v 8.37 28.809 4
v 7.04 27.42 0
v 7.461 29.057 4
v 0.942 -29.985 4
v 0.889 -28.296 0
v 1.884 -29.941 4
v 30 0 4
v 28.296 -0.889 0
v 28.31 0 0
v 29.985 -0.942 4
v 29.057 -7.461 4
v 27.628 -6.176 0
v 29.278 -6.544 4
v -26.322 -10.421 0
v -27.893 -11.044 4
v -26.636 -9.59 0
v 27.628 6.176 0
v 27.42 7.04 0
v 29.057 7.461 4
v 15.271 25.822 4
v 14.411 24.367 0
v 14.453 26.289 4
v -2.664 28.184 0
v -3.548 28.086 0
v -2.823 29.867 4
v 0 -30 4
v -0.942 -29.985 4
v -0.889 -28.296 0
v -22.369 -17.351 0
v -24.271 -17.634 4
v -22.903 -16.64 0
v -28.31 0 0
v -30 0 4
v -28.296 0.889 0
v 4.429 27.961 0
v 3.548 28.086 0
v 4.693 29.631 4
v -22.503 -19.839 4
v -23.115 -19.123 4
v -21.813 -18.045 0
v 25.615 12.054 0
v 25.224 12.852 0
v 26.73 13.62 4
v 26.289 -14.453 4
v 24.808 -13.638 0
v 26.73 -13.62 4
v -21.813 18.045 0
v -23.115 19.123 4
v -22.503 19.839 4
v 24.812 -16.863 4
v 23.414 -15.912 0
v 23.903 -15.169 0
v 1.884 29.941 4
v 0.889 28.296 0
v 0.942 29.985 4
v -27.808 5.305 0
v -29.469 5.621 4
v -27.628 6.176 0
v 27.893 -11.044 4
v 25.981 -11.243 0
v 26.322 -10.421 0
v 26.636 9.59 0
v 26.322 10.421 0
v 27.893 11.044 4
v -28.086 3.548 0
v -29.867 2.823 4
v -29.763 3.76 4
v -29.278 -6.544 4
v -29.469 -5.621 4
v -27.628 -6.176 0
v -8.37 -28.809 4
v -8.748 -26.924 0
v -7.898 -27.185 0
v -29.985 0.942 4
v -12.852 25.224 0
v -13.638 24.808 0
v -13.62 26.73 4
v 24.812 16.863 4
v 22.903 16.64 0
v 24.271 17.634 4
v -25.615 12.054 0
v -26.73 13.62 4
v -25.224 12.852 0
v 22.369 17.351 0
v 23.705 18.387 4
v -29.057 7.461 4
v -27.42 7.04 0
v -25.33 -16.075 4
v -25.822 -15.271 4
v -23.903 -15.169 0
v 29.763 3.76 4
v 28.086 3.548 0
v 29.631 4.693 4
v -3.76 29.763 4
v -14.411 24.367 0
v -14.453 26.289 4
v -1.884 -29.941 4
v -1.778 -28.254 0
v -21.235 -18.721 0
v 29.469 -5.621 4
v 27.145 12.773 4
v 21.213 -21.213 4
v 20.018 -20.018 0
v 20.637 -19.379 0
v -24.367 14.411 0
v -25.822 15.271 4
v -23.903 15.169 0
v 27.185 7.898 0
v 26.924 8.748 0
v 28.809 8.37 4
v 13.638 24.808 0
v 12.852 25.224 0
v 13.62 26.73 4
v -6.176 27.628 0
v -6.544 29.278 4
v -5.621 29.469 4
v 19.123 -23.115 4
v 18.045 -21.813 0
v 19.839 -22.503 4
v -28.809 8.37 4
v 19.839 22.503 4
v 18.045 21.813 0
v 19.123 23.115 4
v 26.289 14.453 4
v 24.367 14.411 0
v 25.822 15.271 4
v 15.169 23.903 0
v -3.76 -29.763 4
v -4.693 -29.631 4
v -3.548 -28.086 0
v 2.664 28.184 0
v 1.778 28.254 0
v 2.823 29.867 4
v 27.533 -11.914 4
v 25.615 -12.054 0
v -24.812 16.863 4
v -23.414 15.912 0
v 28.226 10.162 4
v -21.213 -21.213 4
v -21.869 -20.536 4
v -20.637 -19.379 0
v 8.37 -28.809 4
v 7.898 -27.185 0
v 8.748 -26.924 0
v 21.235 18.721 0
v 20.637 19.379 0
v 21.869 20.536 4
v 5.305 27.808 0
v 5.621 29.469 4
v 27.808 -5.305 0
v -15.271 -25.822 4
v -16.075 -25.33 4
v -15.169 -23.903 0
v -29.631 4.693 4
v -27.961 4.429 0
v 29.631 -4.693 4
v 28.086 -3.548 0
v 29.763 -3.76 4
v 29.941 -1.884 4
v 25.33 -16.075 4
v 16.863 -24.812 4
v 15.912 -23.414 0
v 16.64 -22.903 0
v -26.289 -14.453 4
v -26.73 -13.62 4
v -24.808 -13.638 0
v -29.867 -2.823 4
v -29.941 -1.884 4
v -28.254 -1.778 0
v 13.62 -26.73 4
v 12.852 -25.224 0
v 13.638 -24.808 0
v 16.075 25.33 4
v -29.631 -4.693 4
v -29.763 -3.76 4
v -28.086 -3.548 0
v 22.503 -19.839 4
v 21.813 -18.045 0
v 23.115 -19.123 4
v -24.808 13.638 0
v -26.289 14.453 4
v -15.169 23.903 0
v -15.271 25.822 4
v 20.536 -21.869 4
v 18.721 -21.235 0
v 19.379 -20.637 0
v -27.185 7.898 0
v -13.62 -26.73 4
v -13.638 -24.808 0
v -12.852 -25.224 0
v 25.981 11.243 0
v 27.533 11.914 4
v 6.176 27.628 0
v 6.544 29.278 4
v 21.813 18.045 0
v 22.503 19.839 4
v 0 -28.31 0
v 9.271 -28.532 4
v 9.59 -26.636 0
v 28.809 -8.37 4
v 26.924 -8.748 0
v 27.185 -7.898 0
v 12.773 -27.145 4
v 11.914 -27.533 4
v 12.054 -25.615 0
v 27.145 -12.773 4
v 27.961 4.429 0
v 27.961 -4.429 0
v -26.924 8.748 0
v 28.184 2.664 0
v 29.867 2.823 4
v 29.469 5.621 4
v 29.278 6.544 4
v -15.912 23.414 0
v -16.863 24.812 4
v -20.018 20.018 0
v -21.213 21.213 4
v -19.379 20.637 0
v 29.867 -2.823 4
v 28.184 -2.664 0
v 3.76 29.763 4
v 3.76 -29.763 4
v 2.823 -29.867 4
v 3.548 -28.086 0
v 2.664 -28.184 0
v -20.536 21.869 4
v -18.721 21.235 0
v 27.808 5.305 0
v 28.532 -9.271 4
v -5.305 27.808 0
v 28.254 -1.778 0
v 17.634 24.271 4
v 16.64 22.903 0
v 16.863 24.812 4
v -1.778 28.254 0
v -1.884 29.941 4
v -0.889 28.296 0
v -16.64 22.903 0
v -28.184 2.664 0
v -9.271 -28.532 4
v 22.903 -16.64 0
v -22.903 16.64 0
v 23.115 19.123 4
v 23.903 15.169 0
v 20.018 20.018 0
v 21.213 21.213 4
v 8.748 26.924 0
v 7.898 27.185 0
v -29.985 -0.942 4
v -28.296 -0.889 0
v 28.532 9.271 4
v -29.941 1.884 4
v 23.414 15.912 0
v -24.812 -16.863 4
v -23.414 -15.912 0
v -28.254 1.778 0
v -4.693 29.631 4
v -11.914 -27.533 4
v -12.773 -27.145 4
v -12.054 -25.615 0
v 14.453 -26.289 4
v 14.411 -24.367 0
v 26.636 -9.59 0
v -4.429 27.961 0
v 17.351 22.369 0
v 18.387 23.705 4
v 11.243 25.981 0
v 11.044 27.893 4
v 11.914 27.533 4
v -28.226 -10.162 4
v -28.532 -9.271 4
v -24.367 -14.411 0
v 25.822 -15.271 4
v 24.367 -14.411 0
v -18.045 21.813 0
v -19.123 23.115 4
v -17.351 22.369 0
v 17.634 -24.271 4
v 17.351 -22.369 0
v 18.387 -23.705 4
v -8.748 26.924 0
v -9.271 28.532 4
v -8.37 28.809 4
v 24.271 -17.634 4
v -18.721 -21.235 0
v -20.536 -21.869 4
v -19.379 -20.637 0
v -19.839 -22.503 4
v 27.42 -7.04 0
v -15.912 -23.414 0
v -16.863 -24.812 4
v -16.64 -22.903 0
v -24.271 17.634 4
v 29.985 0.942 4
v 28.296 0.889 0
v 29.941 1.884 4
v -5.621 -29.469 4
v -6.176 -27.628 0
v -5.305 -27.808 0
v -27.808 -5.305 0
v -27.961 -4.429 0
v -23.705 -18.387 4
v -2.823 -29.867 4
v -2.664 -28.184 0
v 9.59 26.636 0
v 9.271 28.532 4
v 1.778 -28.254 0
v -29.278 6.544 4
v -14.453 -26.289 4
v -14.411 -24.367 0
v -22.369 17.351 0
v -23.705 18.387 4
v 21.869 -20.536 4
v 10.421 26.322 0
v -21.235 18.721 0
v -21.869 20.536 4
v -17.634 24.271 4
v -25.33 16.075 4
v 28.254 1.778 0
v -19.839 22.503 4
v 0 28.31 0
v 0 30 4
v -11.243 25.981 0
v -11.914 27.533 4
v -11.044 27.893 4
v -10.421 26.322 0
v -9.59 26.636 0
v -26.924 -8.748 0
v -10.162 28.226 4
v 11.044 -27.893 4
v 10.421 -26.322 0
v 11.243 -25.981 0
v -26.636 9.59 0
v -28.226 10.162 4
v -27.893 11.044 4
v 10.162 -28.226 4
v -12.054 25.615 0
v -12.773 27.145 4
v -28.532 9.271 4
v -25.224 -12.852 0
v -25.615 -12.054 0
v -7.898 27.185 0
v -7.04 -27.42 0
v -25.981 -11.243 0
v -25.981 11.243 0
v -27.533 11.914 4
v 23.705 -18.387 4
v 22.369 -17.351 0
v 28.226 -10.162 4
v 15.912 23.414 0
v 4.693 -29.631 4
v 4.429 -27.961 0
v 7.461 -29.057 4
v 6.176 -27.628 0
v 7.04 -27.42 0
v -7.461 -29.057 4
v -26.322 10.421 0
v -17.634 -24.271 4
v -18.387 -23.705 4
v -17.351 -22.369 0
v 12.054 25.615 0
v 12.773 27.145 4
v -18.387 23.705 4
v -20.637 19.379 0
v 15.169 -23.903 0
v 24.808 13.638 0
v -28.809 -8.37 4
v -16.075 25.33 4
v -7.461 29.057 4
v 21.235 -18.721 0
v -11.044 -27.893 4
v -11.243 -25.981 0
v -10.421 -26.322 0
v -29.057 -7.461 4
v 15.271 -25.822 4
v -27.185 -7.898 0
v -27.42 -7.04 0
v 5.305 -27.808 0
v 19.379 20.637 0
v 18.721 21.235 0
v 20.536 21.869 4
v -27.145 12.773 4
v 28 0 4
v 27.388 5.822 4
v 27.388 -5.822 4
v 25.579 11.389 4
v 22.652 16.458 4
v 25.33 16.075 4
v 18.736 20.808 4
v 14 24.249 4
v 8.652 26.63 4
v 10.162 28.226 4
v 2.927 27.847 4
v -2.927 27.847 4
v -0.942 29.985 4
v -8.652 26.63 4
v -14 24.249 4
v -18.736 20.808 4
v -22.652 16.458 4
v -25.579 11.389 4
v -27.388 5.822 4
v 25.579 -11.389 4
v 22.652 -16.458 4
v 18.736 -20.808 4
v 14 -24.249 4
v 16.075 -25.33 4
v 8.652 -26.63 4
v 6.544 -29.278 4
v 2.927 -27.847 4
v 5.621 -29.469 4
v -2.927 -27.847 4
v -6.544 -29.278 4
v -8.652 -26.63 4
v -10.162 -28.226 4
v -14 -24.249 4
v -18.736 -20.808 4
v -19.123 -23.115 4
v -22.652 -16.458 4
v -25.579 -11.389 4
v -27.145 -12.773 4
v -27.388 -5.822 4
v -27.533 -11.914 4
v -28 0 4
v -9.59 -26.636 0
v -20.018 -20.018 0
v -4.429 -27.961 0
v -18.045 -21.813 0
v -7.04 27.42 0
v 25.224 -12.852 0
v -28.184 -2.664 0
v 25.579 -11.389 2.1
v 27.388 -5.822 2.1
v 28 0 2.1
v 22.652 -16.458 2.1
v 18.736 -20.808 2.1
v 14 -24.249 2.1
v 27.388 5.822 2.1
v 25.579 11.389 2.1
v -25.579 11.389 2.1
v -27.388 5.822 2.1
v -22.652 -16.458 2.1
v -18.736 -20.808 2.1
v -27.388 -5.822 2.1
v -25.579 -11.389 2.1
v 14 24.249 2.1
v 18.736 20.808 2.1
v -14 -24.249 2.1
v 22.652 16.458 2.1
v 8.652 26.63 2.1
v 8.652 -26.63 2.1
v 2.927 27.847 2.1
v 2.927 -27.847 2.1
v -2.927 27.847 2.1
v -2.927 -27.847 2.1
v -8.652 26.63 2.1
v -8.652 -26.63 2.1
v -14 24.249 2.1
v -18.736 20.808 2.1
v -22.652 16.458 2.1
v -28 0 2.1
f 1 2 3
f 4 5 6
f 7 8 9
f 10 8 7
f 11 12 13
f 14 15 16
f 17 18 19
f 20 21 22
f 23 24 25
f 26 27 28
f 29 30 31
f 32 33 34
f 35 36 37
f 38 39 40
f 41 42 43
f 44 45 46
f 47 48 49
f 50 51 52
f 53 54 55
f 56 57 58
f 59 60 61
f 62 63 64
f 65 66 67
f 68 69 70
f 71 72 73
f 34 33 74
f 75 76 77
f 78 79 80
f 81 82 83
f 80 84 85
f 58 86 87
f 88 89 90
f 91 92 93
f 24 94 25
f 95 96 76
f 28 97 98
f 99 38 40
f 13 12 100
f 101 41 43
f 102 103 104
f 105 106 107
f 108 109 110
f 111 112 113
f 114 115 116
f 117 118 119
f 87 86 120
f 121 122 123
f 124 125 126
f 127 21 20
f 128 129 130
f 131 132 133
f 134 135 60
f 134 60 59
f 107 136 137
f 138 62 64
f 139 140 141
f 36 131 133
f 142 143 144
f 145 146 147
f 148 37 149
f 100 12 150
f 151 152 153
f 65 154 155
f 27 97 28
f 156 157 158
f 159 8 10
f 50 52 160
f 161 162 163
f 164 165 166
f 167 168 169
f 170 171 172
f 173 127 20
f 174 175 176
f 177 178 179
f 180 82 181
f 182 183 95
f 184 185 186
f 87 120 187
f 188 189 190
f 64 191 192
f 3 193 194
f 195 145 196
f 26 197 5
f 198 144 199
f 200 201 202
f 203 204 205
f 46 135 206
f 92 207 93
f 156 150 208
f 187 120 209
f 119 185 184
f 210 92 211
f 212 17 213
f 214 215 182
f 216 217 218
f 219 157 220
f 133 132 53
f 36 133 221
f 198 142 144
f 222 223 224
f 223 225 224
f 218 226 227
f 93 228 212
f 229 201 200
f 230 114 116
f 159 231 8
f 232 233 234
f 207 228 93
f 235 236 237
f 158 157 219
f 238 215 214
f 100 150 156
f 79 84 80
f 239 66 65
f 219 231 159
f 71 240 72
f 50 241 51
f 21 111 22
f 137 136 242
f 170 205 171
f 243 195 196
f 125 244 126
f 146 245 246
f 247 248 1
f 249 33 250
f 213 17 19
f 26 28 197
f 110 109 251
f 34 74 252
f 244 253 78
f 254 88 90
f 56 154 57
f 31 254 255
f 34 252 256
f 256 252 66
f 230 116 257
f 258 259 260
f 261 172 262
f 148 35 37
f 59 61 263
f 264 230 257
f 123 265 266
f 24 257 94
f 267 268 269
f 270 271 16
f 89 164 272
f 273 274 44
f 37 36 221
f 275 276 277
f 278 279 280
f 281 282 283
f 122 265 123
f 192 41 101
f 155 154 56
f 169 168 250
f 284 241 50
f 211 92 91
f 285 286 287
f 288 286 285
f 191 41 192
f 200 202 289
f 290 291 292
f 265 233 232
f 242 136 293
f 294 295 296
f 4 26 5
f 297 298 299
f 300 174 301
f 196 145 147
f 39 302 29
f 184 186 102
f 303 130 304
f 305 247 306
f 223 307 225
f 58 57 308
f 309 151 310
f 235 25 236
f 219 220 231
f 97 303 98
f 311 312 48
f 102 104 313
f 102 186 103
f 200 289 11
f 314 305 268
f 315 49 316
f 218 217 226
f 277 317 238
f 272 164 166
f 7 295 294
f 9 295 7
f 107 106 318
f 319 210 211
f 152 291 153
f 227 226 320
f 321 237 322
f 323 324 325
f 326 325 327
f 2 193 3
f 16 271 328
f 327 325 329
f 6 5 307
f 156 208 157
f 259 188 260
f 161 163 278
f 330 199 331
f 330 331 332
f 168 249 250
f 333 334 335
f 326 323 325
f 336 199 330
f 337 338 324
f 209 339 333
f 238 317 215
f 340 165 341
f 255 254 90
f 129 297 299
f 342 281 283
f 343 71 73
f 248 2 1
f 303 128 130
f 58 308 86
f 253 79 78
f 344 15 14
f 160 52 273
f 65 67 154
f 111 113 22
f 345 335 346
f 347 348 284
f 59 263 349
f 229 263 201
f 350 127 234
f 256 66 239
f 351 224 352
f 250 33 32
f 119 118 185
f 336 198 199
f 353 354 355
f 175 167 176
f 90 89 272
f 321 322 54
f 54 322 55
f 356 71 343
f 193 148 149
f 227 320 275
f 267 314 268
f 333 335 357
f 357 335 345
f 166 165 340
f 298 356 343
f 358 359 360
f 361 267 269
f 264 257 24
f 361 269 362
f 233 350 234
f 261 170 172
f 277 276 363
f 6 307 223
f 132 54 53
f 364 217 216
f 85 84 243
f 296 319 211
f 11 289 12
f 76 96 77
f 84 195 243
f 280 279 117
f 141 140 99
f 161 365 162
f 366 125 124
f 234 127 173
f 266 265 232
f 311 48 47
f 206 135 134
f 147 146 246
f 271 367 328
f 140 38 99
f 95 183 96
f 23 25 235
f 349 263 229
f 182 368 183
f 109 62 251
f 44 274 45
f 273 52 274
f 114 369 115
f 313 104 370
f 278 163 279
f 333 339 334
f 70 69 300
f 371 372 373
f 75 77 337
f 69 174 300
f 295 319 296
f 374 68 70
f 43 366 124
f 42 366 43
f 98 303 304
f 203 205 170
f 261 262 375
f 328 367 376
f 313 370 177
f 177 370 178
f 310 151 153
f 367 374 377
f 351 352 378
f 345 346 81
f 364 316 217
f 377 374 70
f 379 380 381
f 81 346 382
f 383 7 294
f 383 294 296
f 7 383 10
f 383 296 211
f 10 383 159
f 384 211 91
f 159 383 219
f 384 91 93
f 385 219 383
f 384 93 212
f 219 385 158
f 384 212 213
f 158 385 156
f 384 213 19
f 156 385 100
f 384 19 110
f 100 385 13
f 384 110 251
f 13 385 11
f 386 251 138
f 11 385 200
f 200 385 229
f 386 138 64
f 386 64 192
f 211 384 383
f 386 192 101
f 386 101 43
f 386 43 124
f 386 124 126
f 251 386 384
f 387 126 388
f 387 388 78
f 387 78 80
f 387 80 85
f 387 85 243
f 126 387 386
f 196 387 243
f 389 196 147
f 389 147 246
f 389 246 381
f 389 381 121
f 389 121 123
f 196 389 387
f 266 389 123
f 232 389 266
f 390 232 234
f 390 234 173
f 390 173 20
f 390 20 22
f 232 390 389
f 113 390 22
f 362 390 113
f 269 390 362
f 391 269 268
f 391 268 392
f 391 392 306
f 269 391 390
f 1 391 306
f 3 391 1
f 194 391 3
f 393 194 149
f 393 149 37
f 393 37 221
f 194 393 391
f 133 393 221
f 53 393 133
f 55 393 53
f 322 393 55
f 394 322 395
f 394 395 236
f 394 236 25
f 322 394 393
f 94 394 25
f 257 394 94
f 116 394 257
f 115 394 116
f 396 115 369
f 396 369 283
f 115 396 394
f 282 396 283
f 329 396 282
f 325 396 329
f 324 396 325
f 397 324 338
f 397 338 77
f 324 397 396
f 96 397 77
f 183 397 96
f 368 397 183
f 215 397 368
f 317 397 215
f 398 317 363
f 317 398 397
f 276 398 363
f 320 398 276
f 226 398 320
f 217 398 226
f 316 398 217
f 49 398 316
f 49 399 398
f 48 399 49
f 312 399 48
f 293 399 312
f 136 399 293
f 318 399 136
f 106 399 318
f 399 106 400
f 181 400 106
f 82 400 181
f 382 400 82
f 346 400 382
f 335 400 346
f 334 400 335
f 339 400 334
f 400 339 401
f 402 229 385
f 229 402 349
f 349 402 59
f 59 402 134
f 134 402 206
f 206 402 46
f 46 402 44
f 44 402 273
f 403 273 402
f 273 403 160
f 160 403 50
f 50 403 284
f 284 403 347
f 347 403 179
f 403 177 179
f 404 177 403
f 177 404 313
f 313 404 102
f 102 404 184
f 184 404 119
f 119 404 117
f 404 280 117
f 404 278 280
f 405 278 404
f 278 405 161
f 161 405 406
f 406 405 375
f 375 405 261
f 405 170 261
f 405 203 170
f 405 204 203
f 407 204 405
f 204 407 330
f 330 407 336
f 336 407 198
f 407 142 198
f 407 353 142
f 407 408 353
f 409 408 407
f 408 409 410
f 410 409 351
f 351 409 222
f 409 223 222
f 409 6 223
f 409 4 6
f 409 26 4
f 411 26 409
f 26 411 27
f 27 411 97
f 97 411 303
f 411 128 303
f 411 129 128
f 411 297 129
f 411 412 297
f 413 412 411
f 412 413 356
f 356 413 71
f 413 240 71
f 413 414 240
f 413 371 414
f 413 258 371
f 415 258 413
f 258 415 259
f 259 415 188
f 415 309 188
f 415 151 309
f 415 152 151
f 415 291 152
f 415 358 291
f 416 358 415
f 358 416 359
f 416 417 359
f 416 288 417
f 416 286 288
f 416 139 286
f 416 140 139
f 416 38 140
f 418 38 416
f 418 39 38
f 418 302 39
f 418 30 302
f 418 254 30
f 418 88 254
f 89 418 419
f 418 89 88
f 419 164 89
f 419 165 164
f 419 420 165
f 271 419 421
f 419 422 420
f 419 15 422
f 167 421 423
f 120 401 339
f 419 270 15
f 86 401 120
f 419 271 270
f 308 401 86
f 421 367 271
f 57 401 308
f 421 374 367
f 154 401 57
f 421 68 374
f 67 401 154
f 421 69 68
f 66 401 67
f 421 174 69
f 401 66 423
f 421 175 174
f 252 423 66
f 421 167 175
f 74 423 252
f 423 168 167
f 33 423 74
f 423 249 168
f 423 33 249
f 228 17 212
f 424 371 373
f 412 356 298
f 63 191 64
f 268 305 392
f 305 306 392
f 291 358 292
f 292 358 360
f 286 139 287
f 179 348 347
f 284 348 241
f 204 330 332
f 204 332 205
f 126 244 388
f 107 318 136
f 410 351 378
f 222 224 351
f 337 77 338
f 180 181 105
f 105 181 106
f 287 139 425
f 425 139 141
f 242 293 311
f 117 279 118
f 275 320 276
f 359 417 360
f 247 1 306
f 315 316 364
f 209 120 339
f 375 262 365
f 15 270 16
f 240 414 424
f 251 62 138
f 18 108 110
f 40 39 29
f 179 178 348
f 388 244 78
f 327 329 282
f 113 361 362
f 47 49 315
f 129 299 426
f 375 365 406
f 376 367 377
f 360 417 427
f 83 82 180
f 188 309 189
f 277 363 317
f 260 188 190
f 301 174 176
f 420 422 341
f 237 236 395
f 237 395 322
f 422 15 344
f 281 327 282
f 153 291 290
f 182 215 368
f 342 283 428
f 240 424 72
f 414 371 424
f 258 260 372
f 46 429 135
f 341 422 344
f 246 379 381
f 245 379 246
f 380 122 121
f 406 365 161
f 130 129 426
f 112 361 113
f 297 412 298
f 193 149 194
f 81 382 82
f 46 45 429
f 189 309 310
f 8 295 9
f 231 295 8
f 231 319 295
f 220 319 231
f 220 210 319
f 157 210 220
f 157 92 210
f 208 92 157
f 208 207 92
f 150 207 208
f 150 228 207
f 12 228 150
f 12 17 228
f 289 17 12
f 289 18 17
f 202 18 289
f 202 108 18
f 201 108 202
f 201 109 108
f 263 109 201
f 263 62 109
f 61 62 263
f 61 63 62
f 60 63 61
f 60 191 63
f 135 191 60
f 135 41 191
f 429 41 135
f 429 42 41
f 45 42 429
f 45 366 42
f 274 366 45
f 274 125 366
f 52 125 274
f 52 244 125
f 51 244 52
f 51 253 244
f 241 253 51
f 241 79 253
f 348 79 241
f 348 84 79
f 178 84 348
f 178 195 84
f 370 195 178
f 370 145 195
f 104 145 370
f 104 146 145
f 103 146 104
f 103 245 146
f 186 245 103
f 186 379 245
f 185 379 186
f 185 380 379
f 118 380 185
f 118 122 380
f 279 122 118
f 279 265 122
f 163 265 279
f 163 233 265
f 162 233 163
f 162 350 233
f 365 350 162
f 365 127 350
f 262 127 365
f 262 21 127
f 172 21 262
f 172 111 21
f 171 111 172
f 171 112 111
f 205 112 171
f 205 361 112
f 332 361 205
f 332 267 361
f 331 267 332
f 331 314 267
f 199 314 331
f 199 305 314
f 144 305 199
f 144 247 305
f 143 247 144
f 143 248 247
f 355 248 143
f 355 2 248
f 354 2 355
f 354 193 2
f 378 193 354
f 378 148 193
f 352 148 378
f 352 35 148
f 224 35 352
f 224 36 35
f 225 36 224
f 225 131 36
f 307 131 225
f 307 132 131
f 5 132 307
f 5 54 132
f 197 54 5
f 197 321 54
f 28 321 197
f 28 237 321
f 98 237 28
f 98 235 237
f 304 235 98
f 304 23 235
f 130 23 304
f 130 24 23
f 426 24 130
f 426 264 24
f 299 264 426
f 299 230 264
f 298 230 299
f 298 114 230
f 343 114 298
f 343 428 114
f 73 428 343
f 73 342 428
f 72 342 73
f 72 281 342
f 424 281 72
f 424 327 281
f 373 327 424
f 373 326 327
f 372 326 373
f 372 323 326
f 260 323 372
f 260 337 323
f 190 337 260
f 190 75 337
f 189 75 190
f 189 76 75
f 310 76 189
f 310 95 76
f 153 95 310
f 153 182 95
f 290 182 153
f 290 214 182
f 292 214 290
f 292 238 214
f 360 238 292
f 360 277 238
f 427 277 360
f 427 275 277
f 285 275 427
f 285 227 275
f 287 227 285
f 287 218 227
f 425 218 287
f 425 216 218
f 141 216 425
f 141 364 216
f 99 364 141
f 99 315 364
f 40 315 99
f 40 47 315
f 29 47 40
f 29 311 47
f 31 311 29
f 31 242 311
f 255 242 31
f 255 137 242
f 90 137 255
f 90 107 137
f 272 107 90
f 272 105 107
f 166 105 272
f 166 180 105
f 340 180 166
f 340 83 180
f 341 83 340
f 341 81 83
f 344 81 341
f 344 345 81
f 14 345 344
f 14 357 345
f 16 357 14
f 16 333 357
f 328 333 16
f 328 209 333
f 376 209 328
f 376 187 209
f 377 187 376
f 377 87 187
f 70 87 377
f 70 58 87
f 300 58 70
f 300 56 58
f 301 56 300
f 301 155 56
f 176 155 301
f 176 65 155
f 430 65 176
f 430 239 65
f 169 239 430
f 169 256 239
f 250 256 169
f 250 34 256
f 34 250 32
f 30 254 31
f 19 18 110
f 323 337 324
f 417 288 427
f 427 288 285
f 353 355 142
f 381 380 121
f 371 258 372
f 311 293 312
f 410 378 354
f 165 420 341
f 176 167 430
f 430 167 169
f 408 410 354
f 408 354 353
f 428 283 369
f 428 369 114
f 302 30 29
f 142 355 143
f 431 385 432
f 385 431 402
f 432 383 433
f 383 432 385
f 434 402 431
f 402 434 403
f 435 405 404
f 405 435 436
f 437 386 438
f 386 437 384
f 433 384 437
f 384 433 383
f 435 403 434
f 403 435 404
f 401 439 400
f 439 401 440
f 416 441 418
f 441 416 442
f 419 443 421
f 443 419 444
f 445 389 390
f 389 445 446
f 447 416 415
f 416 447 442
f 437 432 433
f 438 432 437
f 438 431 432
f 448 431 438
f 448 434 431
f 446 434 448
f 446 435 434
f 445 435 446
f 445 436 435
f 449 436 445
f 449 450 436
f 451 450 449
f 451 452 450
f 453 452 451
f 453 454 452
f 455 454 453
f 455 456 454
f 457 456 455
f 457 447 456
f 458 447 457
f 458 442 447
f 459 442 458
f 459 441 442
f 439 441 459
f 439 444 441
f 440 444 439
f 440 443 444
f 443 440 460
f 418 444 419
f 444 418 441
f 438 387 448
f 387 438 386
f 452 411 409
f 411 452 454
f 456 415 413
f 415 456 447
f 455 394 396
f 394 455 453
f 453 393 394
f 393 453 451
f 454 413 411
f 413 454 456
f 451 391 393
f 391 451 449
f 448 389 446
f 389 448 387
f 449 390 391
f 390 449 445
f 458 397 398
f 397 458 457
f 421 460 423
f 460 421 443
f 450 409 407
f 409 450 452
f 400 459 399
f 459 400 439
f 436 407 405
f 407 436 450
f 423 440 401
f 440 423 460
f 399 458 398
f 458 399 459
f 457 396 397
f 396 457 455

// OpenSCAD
// Customizable Miniature Base
// Created by Rob Ross, February 2014
//
// Shared under Creative Commons License: Attribution-ShareAlike 3.0 Unported (CC BY-SA 3.0) 
// see http://creativecommons.org/licenses/by-sa/3.0/
//
// Notes:
// - good: 40mm, num_x = 4, stone_offset = 2, master_seed=41, z_compression=1.1

// preview[view:south east, tilt:bottom]

/* [Base] */
// Width of base at the bottom (mm)
base_width = 60; // [25:60]
// Total height of base (mm)
base_height = 4; // [2:5]
// Angle of sidewall (0 degrees is vertical)
base_angle = 25;

have_topper = 0;
have_inset = 1;

/* [Hidden] */

/**** Main Routines ****/

translate([0,0, base_height]) rotate ([180,0,0]) 
{
   difference() {
      union() {
         difference() {
	    base_exterior();
            base_inset();
         }
         // cylinder($fn=80,d=8,h=base_height);
      }
      // translate([0,0,-1]) cylinder($fn=80,d=3,h=10);
   }
}

// base_exterior() - angled sides and top of base
module base_exterior()
{
      difference() {
         cylinder($fn=200, r1 = base_width / 2, 
                  r2 = base_width / 2 -  base_height *sin(base_angle),
                  h = base_height);
      }
}

module base_inset() {
   translate([0,0, -0.1])
      cylinder($fn=30,r=base_width/2-2,h=2);
}

module dogbone() {
   difference() {
      union() {
         // translate([-(base_width-10)/2,-1,0])  cube([base_width-10,2,base_height]);
         translate([-(base_width-10)/2,-2,0])  cube([base_width-10,4,base_height]);
         translate([-(base_width-12)/2,0,0]) cylinder($fn=60,d=5,h=base_height);
         translate([(base_width-12)/2,0,0]) cylinder($fn=60,d=5,h=base_height);
      }
      translate([-(base_width-12)/2,0,-0.1]) cylinder($fn=60,d=3.2,h=base_height+.1);
      translate([(base_width-12)/2,0,-0.1]) cylinder($fn=60,d=3.2,h=base_height+.1);
   }
}
